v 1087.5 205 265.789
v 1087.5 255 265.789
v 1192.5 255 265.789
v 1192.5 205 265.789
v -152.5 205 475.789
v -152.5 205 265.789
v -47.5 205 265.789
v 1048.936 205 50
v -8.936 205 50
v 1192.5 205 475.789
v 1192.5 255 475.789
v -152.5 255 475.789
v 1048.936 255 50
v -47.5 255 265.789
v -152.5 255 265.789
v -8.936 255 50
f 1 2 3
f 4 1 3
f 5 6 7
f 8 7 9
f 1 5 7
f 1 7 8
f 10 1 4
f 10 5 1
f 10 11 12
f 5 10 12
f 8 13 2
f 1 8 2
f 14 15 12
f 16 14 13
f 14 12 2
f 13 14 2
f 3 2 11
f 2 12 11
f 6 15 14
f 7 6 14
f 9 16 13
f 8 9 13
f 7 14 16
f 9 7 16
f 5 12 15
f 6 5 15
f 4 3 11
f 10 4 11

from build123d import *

# Parameters (mm, degrees)
F4_DEPTH = 50


with BuildPart() as f4:
    # F3 (on plane+point) → F4 (new body)
    with BuildSketch(Plane.XZ.offset(-255)):
        Polygon((-152.5, 265.7889200098), (-47.5, 265.7889200098), (-8.9356621785, 50), (1048.9356621785, 50), (1087.5, 265.7889200098), (1192.5, 265.7889200098), (1192.5, 475.7889200098), (-152.5, 475.7889200098), align=None)
    extrude(amount=F4_DEPTH)


solid = f4.part
